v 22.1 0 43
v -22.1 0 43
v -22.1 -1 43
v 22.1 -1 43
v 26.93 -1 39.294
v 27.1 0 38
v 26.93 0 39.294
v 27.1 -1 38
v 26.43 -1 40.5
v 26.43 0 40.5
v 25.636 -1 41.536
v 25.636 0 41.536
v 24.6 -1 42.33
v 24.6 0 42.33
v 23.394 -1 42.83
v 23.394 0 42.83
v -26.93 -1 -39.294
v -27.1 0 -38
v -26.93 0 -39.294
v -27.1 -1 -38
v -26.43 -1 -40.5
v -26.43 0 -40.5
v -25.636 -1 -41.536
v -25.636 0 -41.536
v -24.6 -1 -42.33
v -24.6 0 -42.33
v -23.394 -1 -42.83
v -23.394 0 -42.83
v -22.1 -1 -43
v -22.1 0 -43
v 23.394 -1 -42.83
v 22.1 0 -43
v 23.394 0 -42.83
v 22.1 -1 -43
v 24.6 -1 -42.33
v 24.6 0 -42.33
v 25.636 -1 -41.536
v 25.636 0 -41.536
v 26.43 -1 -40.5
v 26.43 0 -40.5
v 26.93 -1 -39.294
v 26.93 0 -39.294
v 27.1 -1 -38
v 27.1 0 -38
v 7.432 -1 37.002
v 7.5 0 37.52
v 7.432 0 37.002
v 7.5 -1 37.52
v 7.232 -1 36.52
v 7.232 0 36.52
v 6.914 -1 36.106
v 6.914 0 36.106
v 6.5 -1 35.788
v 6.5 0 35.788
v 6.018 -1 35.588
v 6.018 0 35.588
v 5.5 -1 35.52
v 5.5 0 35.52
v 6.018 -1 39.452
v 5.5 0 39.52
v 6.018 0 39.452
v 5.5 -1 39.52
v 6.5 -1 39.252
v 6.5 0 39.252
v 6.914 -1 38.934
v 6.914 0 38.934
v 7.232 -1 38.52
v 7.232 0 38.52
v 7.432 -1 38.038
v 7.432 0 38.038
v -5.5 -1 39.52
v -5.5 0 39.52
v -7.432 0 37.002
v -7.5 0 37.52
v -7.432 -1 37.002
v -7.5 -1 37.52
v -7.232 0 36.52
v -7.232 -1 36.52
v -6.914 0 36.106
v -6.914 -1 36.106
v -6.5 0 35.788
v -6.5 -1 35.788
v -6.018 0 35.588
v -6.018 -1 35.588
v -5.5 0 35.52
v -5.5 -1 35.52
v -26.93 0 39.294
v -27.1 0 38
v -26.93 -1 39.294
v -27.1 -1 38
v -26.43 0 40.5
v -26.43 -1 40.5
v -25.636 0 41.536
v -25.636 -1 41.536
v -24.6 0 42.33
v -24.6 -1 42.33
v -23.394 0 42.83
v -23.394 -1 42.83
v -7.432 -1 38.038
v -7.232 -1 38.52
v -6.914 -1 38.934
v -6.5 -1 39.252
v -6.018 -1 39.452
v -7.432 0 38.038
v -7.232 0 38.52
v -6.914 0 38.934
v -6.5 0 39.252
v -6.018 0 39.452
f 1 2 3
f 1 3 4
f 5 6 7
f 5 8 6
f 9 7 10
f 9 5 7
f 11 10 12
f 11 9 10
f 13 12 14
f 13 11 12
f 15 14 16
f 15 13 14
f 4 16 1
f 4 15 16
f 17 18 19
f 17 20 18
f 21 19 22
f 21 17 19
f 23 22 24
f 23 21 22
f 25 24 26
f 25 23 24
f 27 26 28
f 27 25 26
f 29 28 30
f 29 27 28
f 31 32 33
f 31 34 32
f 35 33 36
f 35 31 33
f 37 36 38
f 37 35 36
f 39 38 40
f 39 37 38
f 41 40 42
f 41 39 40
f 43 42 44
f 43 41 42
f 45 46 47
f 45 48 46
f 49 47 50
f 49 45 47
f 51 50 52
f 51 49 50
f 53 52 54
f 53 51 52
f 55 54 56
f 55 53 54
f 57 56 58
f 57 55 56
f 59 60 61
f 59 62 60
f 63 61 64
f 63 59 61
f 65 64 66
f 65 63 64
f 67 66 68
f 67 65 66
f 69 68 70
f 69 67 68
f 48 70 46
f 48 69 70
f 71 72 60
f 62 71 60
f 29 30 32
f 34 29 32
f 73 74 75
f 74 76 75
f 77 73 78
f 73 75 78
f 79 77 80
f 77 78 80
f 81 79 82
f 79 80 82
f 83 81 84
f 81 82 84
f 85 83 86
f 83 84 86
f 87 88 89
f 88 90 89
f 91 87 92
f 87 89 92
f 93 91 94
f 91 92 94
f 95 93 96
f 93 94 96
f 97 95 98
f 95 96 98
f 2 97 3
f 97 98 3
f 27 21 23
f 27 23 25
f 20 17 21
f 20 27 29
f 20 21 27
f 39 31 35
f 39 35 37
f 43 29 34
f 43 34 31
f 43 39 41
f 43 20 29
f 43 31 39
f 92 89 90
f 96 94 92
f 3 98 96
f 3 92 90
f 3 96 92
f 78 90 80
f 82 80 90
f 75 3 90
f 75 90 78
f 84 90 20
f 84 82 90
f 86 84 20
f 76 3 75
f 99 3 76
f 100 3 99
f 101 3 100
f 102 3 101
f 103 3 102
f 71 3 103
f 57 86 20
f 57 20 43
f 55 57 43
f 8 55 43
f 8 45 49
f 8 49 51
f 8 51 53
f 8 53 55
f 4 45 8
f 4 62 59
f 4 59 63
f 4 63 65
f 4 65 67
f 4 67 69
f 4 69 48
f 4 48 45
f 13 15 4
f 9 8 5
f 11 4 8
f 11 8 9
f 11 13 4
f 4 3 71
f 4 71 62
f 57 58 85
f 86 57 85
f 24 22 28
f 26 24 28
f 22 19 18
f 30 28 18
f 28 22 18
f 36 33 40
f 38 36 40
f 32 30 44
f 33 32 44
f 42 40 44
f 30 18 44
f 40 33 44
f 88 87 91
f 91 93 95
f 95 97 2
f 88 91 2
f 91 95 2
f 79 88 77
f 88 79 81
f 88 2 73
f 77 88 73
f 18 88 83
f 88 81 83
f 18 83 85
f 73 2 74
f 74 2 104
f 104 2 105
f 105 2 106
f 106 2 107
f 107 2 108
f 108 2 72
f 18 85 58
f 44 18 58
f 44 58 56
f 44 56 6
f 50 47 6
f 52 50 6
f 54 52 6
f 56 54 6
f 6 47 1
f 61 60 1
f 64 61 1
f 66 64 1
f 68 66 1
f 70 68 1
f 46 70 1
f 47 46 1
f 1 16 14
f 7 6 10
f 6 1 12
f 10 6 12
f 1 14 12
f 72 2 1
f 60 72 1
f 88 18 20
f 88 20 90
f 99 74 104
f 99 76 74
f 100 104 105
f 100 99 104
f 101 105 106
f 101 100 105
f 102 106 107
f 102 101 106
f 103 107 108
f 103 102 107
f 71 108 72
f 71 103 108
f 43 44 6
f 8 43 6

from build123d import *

# Parameters (mm, degrees)
F0_W     = 54.2
F0_H     = 86
F1_DEPTH = 1
F2_R     = 5
F3_R     = 1.99999


# Not quite as in the source:
# - a fillet or chamfer is up to 0.001 mm smaller than in the source, because OpenCascade refuses the exact size


with BuildPart() as f1:
    # F0 (on Front) → F1 (new body)
    with BuildSketch(Plane.XZ):
        Rectangle(F0_W, F0_H)
        Polygon((-7.5, 37.52), (-7.5, 39.52), (7.5, 39.52), (7.5, 37.52), (7.5, 35.52), (-7.5, 35.52), align=None, mode=Mode.SUBTRACT)
    extrude(amount=F1_DEPTH)

    # F2
    f2_edges = [f1.edges().sort_by_distance(p)[0] for p in [
        (-27.1, -0.5, 43),
        (27.1, -0.5, 43),
        (27.1, -0.5, -43),
        (-27.1, -0.5, -43),
    ]]
    fillet(f2_edges, radius=F2_R)

    # F3 (radius 2 in the source; OpenCascade refuses exactly that, so slightly less here)
    f3_edges = [f1.edges().sort_by_distance(p)[0] for p in [
        (-7.5, -0.5, 39.52),
        (-7.5, -0.5, 35.52),
        (7.5, -0.5, 35.52),
        (7.5, -0.5, 39.52),
    ]]
    fillet(f3_edges, radius=F3_R)


solid = f1.part
